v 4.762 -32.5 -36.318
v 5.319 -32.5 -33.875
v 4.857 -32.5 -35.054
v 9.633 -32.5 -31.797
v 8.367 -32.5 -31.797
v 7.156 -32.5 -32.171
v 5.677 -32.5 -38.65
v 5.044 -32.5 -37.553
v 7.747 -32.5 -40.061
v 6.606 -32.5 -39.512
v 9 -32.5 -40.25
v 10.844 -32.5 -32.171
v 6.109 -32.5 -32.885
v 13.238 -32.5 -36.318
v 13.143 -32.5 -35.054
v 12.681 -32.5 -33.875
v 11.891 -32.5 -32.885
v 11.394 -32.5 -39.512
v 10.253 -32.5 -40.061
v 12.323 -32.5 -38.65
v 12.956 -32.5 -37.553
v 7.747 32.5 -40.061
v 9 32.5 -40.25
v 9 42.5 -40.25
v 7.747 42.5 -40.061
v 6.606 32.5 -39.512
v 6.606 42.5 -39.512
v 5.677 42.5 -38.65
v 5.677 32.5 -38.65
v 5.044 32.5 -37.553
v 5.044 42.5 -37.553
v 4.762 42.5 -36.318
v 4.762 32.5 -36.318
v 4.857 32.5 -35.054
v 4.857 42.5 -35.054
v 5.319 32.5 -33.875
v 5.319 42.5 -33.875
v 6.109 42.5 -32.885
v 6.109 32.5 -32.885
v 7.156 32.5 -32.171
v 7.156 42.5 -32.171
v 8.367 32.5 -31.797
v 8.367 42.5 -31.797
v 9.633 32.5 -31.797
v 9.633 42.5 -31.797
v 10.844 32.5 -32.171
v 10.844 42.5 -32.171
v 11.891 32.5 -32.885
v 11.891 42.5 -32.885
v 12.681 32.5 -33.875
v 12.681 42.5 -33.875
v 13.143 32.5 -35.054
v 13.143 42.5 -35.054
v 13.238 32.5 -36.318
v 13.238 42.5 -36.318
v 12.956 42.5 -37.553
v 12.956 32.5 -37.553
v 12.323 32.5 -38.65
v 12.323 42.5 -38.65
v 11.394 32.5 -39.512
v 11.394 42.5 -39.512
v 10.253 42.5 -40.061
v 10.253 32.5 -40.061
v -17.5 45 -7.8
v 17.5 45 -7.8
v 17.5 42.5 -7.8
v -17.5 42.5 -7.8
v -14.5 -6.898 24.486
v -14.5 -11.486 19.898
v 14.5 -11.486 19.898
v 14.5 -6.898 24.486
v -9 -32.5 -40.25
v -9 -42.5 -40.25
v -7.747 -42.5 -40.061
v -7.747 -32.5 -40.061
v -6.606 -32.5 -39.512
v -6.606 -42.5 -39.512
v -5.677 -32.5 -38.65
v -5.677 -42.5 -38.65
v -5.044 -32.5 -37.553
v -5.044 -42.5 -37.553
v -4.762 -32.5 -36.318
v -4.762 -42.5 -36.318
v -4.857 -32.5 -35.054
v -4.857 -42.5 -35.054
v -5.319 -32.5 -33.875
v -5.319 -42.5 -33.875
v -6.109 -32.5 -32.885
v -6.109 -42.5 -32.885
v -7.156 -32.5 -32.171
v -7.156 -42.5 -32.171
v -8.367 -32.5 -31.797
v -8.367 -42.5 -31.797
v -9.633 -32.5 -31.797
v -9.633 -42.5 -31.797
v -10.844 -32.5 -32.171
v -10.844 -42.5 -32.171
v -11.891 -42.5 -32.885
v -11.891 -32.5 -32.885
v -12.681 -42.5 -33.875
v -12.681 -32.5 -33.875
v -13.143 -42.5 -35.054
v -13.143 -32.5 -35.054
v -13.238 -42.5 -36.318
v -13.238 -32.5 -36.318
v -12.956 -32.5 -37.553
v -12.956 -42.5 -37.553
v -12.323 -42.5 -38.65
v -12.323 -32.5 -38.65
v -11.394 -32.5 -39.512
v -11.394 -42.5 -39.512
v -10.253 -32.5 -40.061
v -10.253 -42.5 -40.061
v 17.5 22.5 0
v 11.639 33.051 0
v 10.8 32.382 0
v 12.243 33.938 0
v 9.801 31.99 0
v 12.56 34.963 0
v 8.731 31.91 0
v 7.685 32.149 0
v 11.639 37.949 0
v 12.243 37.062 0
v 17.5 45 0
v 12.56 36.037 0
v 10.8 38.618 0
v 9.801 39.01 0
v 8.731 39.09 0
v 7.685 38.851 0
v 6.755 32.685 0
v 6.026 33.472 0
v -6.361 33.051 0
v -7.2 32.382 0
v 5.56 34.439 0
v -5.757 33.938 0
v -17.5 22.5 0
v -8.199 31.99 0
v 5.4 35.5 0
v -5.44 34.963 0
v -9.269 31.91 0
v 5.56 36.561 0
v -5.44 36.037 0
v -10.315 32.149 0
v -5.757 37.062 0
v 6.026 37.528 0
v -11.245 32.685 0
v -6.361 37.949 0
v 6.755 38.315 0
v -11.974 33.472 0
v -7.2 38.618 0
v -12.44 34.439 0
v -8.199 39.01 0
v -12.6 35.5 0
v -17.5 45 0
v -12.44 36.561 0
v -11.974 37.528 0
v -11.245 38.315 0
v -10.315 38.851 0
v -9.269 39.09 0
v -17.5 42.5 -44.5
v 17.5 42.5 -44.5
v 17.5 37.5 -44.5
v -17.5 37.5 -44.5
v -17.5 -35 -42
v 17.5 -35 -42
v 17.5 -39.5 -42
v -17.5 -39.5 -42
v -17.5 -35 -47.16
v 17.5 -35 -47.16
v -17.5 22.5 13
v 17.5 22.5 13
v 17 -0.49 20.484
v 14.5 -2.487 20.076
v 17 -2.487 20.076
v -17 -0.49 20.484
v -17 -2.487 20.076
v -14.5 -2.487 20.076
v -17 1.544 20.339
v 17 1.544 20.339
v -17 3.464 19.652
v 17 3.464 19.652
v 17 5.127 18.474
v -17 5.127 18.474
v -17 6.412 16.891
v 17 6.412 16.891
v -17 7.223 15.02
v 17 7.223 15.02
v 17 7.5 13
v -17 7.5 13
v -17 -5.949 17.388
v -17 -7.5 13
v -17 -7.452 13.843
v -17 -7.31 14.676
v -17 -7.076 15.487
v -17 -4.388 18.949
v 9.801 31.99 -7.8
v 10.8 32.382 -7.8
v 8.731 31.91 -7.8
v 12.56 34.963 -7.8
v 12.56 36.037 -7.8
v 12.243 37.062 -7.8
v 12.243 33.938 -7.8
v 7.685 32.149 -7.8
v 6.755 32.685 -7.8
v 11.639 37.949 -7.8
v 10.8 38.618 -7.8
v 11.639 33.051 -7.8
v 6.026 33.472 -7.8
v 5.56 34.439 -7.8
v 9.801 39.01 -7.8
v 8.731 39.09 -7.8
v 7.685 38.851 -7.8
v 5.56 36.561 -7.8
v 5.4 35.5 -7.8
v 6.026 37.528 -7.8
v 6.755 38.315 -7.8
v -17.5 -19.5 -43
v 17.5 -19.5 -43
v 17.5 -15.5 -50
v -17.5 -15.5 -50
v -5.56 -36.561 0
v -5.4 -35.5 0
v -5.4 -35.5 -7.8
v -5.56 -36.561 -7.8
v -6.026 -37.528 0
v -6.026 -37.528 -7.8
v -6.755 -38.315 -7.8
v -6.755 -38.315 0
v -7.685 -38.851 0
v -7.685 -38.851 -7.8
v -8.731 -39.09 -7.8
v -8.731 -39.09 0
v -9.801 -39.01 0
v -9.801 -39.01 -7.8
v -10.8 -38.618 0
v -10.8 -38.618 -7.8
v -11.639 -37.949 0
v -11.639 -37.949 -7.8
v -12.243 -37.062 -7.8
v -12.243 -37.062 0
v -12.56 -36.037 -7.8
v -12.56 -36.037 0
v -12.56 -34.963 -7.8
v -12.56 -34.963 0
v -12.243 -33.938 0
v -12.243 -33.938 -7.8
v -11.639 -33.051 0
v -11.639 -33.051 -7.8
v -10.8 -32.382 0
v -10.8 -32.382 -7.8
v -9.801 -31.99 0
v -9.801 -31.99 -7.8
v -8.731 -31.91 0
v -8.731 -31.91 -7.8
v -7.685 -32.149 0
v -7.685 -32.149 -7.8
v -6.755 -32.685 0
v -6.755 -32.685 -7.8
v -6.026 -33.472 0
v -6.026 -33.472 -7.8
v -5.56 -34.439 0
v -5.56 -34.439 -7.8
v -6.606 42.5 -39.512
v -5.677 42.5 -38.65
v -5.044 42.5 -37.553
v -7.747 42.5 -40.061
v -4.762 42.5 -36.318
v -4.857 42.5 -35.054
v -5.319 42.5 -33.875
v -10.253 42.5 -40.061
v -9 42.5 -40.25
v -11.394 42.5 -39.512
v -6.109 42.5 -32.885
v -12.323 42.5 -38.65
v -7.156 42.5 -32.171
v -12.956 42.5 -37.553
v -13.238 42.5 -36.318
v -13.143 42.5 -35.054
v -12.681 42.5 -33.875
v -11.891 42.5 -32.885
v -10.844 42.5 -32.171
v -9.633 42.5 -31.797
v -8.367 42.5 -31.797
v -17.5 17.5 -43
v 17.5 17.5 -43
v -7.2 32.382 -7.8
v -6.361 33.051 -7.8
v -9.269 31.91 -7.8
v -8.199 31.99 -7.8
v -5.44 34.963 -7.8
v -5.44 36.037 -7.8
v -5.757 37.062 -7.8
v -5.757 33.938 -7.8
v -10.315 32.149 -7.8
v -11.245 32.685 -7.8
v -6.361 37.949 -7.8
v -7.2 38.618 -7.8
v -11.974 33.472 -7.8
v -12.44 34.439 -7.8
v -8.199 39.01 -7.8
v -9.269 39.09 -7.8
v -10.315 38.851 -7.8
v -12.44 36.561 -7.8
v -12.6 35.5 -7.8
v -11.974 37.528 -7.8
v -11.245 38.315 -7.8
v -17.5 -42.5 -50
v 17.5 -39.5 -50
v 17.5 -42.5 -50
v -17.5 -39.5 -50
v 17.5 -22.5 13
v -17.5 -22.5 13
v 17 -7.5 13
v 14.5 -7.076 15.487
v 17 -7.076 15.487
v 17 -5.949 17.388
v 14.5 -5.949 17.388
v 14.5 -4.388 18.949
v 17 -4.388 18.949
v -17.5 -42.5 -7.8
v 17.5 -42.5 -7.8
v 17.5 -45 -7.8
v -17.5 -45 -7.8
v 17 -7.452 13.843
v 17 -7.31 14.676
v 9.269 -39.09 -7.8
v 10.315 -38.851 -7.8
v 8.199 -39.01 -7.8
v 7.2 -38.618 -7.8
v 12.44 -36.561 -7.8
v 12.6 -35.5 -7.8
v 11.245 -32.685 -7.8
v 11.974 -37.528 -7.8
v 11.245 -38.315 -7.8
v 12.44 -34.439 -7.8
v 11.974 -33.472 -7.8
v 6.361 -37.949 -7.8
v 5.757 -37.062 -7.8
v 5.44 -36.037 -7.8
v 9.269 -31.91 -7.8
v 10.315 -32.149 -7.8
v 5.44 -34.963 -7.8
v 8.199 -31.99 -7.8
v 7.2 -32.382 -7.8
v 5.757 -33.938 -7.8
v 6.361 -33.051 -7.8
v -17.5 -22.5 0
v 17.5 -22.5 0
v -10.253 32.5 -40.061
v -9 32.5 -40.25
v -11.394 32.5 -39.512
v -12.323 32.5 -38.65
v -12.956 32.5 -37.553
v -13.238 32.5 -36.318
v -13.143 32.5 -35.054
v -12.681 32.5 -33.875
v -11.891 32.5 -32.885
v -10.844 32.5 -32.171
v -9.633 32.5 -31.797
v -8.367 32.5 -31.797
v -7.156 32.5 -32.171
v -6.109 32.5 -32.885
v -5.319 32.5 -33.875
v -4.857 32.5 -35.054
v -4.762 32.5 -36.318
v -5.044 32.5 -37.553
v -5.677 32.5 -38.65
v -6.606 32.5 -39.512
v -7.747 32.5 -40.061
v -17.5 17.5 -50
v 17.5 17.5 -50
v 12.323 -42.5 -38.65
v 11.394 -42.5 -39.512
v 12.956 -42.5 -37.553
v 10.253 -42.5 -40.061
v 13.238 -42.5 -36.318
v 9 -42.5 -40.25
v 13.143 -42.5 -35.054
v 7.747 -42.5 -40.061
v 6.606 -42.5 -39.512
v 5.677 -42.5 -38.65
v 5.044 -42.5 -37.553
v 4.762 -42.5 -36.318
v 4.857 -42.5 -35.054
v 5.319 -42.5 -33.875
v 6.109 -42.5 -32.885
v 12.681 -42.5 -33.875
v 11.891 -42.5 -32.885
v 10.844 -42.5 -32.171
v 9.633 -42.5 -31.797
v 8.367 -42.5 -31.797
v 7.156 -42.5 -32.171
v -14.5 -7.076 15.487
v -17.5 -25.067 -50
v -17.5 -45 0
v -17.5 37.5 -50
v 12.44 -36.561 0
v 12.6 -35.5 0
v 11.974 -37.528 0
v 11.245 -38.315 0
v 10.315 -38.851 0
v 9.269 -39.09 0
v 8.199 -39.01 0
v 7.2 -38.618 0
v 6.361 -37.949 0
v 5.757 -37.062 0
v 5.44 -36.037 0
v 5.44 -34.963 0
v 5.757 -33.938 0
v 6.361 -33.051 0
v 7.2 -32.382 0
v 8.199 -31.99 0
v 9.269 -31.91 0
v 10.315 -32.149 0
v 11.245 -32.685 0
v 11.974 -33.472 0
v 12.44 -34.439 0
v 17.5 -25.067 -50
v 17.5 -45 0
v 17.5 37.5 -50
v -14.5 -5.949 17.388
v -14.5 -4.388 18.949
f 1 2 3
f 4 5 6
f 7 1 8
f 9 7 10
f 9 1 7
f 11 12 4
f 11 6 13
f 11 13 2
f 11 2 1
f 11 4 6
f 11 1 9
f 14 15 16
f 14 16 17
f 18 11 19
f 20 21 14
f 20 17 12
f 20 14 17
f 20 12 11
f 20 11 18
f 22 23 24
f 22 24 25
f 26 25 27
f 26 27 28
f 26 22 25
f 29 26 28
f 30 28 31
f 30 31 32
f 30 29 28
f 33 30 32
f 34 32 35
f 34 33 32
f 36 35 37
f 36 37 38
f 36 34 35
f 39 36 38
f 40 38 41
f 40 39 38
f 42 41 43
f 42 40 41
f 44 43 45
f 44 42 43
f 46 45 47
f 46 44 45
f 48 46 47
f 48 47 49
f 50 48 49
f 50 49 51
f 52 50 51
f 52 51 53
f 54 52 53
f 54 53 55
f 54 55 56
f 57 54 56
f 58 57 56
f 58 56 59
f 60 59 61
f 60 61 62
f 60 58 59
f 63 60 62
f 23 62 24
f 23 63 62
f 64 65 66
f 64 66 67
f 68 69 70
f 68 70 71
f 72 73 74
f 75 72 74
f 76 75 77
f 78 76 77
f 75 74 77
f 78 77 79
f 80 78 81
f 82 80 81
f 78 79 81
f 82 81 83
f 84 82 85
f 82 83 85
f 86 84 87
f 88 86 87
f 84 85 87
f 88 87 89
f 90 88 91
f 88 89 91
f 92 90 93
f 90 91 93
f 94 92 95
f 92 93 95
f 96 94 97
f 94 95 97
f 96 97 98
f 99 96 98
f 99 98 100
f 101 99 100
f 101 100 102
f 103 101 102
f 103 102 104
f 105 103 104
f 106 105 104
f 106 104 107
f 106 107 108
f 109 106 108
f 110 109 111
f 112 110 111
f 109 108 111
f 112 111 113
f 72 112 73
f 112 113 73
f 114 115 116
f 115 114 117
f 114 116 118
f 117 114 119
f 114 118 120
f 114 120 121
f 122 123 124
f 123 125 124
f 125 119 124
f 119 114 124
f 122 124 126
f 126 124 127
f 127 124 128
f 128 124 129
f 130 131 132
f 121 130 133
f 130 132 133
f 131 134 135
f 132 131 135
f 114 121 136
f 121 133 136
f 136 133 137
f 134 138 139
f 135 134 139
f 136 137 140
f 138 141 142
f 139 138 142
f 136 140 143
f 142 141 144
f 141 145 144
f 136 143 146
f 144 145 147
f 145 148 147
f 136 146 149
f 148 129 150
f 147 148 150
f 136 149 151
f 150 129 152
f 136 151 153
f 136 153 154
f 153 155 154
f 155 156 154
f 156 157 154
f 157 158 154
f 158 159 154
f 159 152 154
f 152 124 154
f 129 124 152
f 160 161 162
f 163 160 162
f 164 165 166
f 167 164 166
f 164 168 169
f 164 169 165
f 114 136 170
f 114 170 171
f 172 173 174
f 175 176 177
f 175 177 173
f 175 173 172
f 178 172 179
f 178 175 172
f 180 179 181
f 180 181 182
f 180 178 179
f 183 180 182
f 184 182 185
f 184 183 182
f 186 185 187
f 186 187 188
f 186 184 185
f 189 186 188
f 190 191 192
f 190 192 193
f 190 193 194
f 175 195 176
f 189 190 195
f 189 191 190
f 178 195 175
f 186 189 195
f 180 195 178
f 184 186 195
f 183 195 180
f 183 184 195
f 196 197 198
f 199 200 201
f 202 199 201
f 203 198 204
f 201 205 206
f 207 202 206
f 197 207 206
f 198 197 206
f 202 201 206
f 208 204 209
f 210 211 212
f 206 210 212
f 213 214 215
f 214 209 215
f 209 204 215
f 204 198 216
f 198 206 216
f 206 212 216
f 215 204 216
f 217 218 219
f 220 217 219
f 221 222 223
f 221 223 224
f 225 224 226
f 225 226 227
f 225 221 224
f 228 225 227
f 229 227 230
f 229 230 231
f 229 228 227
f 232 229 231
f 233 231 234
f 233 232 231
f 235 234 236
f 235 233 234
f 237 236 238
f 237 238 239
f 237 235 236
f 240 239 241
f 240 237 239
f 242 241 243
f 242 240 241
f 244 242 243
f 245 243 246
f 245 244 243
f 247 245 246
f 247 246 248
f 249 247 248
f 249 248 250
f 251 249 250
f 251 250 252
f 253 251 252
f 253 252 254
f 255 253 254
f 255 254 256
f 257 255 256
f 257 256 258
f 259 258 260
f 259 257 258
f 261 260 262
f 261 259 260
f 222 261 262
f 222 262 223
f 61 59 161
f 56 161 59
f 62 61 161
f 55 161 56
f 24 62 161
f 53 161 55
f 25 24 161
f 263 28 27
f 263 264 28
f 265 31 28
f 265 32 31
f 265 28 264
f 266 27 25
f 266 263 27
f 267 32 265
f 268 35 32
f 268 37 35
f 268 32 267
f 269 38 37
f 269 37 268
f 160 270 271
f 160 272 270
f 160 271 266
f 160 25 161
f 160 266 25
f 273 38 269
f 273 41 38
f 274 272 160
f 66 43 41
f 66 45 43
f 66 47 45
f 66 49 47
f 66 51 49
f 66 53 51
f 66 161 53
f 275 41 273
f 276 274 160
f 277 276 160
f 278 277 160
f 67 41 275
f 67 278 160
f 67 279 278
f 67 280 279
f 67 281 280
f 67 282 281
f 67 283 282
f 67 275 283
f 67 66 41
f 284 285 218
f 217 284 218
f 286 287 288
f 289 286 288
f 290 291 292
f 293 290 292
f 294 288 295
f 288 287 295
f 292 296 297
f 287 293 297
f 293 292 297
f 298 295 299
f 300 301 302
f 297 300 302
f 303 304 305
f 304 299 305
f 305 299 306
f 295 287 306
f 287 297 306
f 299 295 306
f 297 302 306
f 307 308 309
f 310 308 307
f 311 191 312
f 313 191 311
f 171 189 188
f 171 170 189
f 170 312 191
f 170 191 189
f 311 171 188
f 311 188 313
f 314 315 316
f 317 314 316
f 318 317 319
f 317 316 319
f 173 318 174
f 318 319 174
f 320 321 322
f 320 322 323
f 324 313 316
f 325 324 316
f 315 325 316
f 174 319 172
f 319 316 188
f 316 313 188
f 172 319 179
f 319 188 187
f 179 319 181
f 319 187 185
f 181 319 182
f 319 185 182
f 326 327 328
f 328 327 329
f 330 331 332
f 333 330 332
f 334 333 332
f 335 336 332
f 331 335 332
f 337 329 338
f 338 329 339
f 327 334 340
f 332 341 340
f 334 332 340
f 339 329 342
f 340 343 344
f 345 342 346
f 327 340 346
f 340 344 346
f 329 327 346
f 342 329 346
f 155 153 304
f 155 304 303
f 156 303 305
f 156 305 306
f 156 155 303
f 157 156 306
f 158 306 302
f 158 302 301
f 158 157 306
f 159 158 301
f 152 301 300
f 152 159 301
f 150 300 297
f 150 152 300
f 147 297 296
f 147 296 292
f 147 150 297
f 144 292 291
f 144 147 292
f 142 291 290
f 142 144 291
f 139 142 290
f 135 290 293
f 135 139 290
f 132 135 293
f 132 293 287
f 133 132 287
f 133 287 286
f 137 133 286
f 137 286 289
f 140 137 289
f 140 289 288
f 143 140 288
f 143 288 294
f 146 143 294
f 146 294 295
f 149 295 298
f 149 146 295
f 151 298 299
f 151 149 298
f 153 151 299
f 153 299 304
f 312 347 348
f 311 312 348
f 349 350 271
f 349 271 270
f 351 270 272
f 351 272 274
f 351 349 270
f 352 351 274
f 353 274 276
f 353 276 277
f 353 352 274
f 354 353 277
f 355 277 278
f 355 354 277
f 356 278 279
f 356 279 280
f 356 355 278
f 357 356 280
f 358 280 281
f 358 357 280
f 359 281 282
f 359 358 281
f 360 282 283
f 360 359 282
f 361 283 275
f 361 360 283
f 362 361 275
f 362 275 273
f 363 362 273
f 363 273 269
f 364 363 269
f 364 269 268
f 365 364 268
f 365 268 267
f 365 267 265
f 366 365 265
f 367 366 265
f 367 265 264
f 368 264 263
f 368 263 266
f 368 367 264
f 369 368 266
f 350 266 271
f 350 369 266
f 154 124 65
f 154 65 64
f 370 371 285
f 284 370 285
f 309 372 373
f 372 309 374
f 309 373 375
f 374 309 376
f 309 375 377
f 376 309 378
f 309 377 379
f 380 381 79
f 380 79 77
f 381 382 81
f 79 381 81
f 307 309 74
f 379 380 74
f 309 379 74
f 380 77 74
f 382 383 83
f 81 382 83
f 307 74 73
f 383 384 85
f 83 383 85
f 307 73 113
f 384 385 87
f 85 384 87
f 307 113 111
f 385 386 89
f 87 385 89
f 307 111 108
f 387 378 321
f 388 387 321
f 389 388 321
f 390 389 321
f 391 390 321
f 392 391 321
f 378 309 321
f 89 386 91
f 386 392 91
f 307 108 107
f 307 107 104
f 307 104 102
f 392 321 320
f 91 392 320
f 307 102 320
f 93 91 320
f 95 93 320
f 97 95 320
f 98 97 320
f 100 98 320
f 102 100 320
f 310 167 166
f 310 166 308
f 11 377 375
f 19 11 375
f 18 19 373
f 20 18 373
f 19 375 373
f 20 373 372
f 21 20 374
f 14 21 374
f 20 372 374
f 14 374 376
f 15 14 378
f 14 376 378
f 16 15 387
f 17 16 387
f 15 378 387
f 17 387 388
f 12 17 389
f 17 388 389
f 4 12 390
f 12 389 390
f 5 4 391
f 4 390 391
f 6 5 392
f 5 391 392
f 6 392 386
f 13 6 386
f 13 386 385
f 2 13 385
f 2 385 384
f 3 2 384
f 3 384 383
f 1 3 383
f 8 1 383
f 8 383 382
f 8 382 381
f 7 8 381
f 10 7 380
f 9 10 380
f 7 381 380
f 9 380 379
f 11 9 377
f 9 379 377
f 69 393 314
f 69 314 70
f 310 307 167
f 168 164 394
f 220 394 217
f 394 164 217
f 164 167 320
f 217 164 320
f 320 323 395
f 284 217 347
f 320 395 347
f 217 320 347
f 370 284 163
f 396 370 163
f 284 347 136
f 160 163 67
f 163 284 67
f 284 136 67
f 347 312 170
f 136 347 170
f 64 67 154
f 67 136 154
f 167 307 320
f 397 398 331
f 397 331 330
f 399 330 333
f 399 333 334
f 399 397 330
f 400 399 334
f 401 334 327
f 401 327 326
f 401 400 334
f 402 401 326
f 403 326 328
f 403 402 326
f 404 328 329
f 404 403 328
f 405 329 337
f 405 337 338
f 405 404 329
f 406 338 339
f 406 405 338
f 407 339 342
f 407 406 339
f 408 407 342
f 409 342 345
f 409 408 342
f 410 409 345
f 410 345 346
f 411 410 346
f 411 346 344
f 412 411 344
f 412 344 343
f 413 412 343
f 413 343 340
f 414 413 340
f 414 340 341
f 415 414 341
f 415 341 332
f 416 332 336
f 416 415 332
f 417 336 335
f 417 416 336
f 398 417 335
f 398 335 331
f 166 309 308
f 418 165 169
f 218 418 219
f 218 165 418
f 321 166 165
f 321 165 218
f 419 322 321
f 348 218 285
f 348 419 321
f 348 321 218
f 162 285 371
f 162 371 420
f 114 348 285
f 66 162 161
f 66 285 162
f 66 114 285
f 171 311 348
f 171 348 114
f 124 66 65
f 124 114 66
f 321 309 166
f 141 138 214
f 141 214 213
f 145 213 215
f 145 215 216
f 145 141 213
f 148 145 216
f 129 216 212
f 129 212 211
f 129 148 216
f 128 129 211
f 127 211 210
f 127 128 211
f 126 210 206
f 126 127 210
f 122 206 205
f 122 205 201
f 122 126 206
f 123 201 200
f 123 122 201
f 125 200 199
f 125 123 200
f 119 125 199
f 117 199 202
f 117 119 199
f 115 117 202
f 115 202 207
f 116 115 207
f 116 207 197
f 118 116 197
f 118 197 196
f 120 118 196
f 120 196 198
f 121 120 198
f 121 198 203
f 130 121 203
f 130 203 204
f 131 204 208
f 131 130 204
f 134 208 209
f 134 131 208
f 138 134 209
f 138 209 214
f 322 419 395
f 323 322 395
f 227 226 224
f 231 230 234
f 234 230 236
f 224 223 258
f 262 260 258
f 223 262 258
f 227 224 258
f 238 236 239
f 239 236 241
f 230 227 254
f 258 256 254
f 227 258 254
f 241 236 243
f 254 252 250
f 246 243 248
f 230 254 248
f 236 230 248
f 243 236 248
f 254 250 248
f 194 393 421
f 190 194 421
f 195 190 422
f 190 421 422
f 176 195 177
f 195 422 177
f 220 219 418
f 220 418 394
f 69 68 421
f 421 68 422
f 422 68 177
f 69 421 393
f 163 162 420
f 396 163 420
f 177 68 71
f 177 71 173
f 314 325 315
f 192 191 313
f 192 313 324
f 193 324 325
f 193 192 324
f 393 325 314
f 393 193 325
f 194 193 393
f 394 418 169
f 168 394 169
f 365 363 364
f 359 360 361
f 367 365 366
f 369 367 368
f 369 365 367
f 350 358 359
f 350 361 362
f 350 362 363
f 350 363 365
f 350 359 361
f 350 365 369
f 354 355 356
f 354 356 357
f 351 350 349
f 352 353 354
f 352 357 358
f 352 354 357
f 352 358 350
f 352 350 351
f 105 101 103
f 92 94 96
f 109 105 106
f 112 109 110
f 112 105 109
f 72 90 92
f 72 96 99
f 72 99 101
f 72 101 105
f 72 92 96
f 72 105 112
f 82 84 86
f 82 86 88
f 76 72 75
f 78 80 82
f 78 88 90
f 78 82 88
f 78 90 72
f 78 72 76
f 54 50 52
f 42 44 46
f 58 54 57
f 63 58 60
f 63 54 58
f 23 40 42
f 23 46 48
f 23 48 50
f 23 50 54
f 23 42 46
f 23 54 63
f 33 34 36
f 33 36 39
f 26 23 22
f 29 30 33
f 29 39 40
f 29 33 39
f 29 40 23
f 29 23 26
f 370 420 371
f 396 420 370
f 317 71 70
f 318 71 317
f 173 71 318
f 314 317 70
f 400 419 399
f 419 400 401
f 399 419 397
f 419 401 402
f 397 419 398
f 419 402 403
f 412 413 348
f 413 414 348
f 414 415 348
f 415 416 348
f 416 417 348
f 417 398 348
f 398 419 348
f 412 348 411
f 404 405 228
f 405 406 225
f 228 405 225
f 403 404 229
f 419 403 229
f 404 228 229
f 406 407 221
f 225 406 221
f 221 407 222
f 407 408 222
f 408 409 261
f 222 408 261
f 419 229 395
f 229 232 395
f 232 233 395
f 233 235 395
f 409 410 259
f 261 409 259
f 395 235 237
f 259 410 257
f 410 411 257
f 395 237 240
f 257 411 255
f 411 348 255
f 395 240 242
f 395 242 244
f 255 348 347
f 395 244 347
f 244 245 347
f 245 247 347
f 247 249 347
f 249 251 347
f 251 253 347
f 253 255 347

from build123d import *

# Parameters (mm, degrees)
SKETCH_1_W           = 35
SKETCH_1_H           = 45
EXTRUDE_1_DEPTH      = 13
SKETCH_2_W           = 35
SKETCH_2_H           = 90
SKETCH_2_R           = 3.6
EXTRUDE_2_DEPTH      = 7.8
SKETCH_3_W           = 35
SKETCH_3_H           = 85
EXTRUDE_3_DEPTH      = 42.2
CUT_EXTRUDE_1_DEPTH  = 65
EXTRUDE_4_DEPTH      = 17
EXTRUDE_4_DEPTH_BACK = 17
CUT_EXTRUDE_2_DEPTH  = 2.5
CUT_EXTRUDE_START    = -2.5
CUT_EXTRUDE_3_DEPTH  = 2.5
SKETCH_8_R           = 4.25
CUT_EXTRUDE_4_DEPTH  = 10
CUT_EXTRUDE_START_2  = -10
SKETCH_9_R           = 4.25
CUT_EXTRUDE_5_DEPTH  = 10


with BuildPart() as part:
    # Эскиз1 → Вытянуть1 (new body)
    with BuildSketch(Plane.XY):
        Rectangle(SKETCH_1_W, SKETCH_1_H)
    extrude(amount=EXTRUDE_1_DEPTH)

    # Эскиз2 → Вытянуть2 (add)
    with BuildSketch(Plane(origin=(0, 0, 0), x_dir=(-1, 0, 0), z_dir=(0, 0, -1))):
        Rectangle(SKETCH_2_W, SKETCH_2_H)
        with Locations((9, 35.5)):
            Circle(SKETCH_2_R, mode=Mode.SUBTRACT)
        with Locations((-9, 35.5)):
            Circle(SKETCH_2_R, mode=Mode.SUBTRACT)
        with Locations(Location((-9, -35.5, 0), (0, 0, 180))):
            Circle(SKETCH_2_R, mode=Mode.SUBTRACT)
        with Locations(Location((9, -35.5, 0), (0, 0, 180))):
            Circle(SKETCH_2_R, mode=Mode.SUBTRACT)
    extrude(amount=EXTRUDE_2_DEPTH)

    # Эскиз3 → Вытянуть3 (add)
    with BuildSketch(Plane(origin=(0, 0, -7.8), x_dir=(-1, 0, 0), z_dir=(0, 0, -1))):
        Rectangle(SKETCH_3_W, SKETCH_3_H)
    extrude(amount=EXTRUDE_3_DEPTH)

    # Эскиз4 → Вырез-Вытянуть1 (cut)
    with BuildSketch(Plane(origin=(17.5, 0, 0), x_dir=(0, 0, -1), z_dir=(1, 0, 0))):
        Polygon((72.312464651, -50.93467969), (72.312464651, 49.741254374), (44.5, 49.741254374), (44.5, 37.5), (50, 37.5), (50, 17.5), (43, 17.5), (43, -19.5), (50, -15.5), (50, -25.067494223), (47.159605794, -35), (42, -35), (42, -39.5), (50, -39.5), (50, -42.5), align=None)
    extrude(amount=-CUT_EXTRUDE_1_DEPTH, mode=Mode.SUBTRACT)

    # Эскиз5 → Вытянуть4 (add, two sides: drawn at the far end of the back side and taken through both)
    with BuildSketch(Plane(origin=(0, 0, 0), x_dir=(0, 0, -1), z_dir=(1, 0, 0)).offset(-EXTRUDE_4_DEPTH_BACK)):
        with BuildLine():
            Line((-15.487344192, -7.075529582), (-19.89829546, -11.486480851))
            Line((-19.89829546, -11.486480851), (-24.486480851, -6.89829546))
            Line((-24.486480851, -6.89829546), (-20.075529582, -2.487344192))
            ThreePointArc((-20.075529582, -2.487344192), (-7.696699141, 5.303300859), (-15.487344192, -7.075529582))
        make_face()
    extrude(amount=EXTRUDE_4_DEPTH + EXTRUDE_4_DEPTH_BACK)

    # Эскиз6 → Вырез-Вытянуть2 (cut)
    with BuildSketch(Plane(origin=(17, 0, 0), x_dir=(0, 0, -1), z_dir=(1, 0, 0))):
        with BuildLine():
            Line((-20.075529582, -2.487344192), (-24.486480851, -6.89829546))
            Line((-24.486480851, -6.89829546), (-19.89829546, -11.486480851))
            Line((-19.89829546, -11.486480851), (-15.487344192, -7.075529582))
            ThreePointArc((-15.487344192, -7.075529582), (-18.217507711, -5.217507711), (-20.075529582, -2.487344192))
        make_face()
    extrude(amount=-CUT_EXTRUDE_2_DEPTH, mode=Mode.SUBTRACT)

    # Эскиз7 → Вырез-Вытянуть3 (cut)
    with BuildSketch(Plane.ZY.offset(17).offset(CUT_EXTRUDE_START)):
        with BuildLine():
            Line((20.075529582, -2.487344192), (24.486480851, -6.89829546))
            Line((24.486480851, -6.89829546), (19.89829546, -11.486480851))
            Line((19.89829546, -11.486480851), (15.487344192, -7.075529582))
            ThreePointArc((15.487344192, -7.075529582), (18.217507711, -5.217507711), (20.075529582, -2.487344192))
        make_face()
    extrude(amount=CUT_EXTRUDE_3_DEPTH, mode=Mode.SUBTRACT)

    # Эскиз8 → Вырез-Вытянуть4 (cut)
    with BuildSketch(Plane.XZ.offset(42.5)):
        with Locations(Location((9, -36, 0), (0, 0, 270))):
            Circle(SKETCH_8_R)
        with Locations(Location((-9, -36, 0), (0, 0, 270))):
            Circle(SKETCH_8_R)
    extrude(amount=-CUT_EXTRUDE_4_DEPTH, mode=Mode.SUBTRACT)

    # Эскиз9 → Вырез-Вытянуть5 (cut)
    with BuildSketch(Plane(origin=(0, 42.5, 0), x_dir=(-1, 0, 0), z_dir=(0, 1, 0)).offset(CUT_EXTRUDE_START_2)):
        with Locations(Location((-9, -36, 0), (0, 0, 270))):
            Circle(SKETCH_9_R)
        with Locations(Location((9, -36, 0), (0, 0, 270))):
            Circle(SKETCH_9_R)
    extrude(amount=CUT_EXTRUDE_5_DEPTH, mode=Mode.SUBTRACT)


solid = part.part
